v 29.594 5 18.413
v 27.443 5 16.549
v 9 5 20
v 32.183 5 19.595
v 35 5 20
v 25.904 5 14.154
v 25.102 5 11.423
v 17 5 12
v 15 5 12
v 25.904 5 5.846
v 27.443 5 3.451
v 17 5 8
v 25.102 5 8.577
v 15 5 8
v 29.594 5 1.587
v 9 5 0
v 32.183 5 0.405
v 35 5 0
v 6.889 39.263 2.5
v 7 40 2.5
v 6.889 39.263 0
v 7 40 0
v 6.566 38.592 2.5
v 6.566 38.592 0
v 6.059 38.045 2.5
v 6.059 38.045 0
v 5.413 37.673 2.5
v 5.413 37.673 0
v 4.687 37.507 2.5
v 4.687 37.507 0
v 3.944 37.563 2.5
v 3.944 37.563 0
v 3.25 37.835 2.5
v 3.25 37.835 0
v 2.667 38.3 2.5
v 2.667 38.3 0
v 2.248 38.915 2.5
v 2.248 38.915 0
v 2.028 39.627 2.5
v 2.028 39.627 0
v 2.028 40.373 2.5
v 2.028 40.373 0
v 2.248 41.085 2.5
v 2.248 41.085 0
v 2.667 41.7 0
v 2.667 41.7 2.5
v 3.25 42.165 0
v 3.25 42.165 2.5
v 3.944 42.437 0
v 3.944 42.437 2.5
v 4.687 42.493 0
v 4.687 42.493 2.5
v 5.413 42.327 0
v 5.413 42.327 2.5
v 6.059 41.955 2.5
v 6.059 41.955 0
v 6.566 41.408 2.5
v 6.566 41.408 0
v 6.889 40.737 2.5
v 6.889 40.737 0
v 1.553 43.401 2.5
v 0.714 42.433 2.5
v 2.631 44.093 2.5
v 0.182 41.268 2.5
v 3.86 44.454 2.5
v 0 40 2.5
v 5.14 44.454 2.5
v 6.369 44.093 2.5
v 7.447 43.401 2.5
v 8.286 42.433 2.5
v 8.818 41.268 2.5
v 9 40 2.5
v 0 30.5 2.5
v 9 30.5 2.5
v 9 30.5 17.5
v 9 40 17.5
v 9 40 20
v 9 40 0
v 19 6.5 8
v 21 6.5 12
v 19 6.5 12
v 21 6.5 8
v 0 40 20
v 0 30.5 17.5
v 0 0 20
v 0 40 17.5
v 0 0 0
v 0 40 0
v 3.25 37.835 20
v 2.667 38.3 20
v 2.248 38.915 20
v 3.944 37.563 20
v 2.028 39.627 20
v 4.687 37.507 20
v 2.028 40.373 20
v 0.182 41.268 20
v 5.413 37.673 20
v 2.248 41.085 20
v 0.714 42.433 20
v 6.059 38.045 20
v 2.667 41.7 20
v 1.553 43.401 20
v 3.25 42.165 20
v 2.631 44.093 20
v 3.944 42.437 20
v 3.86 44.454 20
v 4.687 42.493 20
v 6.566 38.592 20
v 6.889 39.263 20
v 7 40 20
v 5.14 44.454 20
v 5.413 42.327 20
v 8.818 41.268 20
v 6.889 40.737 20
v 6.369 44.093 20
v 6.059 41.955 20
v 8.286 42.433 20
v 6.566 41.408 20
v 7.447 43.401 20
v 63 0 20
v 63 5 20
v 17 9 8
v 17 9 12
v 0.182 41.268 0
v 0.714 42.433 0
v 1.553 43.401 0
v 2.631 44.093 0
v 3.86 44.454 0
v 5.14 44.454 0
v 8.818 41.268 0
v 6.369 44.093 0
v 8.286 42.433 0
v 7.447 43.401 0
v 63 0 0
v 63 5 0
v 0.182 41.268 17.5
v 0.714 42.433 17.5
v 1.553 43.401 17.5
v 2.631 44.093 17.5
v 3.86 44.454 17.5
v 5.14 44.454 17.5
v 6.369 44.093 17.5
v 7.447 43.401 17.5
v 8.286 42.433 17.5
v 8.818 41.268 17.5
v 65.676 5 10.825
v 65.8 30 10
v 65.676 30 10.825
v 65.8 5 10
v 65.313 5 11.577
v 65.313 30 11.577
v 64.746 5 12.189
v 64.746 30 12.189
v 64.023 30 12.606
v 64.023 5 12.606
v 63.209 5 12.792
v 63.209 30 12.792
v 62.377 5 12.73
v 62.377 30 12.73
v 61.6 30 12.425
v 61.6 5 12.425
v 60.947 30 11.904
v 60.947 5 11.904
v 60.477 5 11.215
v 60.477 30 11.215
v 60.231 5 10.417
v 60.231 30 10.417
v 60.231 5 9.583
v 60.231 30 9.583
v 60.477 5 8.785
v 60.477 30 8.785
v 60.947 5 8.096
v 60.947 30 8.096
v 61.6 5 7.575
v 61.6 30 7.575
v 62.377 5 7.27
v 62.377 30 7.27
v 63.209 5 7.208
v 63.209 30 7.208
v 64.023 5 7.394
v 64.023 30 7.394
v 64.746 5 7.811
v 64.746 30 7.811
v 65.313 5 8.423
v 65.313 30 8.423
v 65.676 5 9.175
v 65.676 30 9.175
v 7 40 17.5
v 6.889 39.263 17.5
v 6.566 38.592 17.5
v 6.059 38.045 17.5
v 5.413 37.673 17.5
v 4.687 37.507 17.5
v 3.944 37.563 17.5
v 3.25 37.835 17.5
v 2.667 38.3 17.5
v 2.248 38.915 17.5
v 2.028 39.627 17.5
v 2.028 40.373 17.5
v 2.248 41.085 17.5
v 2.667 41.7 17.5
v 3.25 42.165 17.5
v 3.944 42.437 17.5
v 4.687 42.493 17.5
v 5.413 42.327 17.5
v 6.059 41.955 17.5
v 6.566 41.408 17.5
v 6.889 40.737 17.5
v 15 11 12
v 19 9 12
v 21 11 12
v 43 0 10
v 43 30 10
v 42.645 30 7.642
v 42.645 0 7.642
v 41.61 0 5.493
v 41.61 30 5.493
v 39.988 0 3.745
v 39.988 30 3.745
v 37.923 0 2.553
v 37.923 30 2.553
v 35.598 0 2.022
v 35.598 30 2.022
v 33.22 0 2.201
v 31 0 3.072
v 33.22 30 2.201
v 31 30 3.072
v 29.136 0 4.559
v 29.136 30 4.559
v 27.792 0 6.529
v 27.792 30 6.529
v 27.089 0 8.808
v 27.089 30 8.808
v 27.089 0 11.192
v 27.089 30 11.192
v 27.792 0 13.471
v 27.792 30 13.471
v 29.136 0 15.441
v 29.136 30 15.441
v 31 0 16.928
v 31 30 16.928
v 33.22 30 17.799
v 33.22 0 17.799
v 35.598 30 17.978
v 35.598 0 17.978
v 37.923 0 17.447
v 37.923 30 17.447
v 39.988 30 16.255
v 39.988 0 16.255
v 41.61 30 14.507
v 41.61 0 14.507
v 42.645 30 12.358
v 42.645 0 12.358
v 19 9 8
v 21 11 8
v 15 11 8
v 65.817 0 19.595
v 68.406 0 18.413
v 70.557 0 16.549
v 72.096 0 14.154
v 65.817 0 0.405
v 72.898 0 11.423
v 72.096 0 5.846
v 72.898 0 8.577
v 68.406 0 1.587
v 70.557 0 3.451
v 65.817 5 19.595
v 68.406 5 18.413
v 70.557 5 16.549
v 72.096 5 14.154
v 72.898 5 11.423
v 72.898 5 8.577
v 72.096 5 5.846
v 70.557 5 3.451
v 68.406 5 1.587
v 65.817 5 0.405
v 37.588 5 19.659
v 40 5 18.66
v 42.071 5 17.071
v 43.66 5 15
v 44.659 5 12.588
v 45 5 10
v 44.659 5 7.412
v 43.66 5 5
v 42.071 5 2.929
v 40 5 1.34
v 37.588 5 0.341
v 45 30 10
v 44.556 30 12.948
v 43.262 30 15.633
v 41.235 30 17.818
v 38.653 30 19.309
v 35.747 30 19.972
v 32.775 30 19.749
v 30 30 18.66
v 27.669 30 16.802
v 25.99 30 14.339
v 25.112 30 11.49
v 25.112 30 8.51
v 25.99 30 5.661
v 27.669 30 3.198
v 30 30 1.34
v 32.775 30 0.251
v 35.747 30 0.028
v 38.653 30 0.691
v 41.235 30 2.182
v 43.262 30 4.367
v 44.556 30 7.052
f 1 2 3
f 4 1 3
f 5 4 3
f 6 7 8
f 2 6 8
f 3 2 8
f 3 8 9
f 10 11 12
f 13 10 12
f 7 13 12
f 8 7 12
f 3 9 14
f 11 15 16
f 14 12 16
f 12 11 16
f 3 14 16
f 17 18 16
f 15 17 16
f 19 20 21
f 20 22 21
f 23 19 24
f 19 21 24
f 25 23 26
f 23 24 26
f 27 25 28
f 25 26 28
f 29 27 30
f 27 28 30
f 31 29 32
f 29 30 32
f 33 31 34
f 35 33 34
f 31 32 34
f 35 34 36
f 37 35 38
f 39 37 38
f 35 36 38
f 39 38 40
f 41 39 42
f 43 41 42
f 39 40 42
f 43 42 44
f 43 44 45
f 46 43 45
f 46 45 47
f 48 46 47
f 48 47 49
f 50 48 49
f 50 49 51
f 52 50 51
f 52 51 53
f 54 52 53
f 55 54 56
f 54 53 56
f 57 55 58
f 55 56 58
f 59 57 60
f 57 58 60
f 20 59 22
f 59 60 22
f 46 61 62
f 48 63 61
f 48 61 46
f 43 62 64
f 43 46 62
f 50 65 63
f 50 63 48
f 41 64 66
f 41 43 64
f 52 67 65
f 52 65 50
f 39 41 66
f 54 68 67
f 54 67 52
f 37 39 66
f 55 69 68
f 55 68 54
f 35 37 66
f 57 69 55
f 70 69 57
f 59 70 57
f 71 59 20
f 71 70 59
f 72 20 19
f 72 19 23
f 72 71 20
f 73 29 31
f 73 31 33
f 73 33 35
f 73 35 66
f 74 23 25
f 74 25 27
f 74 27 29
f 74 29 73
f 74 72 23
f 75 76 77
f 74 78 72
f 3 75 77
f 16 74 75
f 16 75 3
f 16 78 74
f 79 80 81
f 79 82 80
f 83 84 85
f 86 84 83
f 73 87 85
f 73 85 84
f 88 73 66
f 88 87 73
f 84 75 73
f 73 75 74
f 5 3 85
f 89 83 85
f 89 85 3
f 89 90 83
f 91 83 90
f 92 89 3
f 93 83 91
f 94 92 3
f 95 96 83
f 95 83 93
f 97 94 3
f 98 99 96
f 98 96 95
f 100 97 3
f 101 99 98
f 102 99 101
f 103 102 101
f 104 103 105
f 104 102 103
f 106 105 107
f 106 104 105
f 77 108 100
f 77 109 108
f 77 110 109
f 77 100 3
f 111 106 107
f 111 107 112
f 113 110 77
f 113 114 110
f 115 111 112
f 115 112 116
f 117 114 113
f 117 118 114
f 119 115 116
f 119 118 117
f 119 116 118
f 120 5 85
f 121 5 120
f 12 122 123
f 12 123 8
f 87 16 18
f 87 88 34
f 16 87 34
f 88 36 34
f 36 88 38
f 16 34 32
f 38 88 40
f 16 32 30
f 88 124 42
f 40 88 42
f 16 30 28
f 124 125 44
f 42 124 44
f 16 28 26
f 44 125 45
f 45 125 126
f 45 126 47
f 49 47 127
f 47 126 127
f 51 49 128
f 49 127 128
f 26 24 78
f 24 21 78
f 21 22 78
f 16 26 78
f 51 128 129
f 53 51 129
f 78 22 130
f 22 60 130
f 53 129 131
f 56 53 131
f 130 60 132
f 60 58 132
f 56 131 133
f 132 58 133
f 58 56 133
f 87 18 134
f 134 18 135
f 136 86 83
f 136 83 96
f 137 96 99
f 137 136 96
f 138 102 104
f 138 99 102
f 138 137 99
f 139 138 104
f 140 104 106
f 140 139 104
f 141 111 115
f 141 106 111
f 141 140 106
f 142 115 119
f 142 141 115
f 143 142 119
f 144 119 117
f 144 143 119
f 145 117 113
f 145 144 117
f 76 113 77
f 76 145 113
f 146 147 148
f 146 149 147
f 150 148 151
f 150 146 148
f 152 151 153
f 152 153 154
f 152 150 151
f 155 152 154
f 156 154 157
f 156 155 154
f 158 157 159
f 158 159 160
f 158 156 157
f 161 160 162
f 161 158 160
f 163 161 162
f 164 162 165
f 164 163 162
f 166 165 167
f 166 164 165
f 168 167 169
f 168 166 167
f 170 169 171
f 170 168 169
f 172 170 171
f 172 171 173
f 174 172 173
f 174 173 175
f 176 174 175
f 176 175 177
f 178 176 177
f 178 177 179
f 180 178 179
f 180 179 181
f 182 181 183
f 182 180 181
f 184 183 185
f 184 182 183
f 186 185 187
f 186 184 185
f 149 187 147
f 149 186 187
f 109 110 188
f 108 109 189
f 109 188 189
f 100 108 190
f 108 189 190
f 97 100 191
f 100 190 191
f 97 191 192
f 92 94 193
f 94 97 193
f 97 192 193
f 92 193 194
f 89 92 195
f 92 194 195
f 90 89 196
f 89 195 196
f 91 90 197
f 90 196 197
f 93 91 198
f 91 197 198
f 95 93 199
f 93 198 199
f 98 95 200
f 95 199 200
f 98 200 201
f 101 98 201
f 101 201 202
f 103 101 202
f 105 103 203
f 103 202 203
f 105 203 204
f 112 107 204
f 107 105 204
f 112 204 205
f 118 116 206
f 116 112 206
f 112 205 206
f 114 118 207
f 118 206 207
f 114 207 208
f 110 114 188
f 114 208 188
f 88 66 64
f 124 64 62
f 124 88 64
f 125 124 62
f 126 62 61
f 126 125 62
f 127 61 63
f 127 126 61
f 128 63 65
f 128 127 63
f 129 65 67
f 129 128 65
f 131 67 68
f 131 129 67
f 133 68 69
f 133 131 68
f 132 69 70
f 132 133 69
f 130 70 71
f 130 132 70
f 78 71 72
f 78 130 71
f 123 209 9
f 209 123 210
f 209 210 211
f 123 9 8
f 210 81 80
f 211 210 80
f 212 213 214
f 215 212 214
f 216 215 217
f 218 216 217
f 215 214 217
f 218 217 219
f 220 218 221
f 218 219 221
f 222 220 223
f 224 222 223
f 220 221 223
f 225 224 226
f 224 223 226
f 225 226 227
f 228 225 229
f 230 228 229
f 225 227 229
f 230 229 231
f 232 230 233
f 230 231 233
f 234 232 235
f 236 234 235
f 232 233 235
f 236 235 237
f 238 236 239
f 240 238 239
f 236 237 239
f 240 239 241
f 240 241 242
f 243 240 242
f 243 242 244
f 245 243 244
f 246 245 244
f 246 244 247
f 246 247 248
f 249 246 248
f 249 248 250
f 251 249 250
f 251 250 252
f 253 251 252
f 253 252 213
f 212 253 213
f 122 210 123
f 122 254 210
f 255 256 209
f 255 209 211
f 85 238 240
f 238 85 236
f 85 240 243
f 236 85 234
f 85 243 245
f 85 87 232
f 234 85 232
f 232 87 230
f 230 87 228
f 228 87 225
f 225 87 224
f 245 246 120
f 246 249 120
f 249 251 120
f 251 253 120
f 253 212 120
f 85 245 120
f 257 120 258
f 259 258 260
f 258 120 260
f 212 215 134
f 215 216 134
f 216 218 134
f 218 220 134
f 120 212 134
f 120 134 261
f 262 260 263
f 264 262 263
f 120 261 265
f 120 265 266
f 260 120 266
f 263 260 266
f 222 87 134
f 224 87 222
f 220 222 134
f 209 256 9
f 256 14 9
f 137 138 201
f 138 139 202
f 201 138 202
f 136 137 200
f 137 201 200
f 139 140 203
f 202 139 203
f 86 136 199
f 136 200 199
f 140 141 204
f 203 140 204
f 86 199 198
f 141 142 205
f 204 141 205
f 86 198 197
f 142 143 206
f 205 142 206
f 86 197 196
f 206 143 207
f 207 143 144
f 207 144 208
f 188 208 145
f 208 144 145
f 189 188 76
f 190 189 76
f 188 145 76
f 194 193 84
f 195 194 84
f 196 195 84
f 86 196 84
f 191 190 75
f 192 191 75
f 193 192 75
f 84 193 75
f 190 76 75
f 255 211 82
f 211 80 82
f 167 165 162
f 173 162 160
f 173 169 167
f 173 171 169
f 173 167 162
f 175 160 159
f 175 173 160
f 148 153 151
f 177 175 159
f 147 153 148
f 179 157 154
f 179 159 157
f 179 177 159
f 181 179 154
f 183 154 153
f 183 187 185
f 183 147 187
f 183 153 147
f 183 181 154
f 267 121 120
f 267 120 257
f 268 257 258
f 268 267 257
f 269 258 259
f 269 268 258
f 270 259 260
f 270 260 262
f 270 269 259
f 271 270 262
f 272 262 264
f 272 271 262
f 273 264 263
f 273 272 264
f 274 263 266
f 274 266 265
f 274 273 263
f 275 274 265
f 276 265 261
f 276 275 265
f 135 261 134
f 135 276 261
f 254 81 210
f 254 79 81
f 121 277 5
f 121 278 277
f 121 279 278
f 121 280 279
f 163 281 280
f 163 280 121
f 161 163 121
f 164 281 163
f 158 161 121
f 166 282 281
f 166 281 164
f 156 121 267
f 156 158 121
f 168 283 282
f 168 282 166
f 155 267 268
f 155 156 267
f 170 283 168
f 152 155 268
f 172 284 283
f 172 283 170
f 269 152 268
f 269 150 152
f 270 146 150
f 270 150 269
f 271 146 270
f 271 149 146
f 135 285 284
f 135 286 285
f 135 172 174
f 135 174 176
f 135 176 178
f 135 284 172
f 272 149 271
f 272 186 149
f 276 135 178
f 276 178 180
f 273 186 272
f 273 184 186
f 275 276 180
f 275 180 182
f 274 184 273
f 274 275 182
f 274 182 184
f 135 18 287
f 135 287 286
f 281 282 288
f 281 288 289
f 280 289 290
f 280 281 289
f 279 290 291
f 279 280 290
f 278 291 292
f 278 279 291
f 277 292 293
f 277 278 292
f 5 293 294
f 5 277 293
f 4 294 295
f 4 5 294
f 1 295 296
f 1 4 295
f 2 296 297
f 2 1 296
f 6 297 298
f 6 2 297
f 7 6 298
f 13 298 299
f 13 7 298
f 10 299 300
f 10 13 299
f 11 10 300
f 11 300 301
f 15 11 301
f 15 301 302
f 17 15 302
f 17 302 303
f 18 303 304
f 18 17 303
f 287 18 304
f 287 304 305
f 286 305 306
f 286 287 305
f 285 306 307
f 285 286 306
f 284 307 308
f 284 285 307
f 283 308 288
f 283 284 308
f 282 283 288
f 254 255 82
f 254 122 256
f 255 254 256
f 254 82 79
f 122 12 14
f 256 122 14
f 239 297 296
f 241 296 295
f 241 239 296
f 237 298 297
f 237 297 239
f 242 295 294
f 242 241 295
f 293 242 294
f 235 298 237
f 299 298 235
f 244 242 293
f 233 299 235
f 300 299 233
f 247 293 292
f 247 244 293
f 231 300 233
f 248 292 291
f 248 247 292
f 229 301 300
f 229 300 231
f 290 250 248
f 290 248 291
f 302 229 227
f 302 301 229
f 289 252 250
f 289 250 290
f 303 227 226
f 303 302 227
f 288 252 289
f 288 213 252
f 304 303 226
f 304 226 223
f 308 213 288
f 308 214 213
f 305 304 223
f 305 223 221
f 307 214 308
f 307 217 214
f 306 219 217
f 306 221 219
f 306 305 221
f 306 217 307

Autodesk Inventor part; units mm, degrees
ref_plane "YZ Plane" through (0, 0, 0) normal (1, 0, 0) x (0, 1, 0)
ref_plane "XZ Plane" through (0, 0, 0) normal (0, 1, 0) x (-1, 0, 0)
ref_plane "XY Plane" through (0, 0, 0) normal (0, 0, 1) x (1, 0, 0)
sketch "Sketch1" plane through (0, 0, 0) normal (0, 0, 1) x (1, 0, 0)
  line L0 (0, 0) -> (0, 40)
  line L1 (0, 0) -> (63, 0)
  line L2 (63, 0) -> (63, 5)
  line L3 (63, 5) -> (9, 5)
  arc A0 (9, 40) -> (0, 40) centre (4.5, 40) ccw
  line L4 (9, 40) -> (9, 5)
  circle A1 centre (4.5, 40) radius 2.5
  dimension "d0" = 40
  dimension "d2" = 5
  dimension "d6" = 4.5
  dimension "d7" = 5
  dimension "d8" = 9
  dimension "d9" = 54
  dimension "d47" = 32.5
extrude "Extrusion1" add sketch "Sketch1" along normal blind 20
sketch "Sketch2" plane through (9, 5, 0) normal (0, 1, 0) x (1, 0, 0)
  line L0 (0, 0) -> (0, -20) projected
  circle A0 centre (26, -10) radius 10
  line L1 (0, 0) -> (54, 0) projected
  circle A1 centre (54, -10) radius 2.8
  line L2 (54, 0) -> (54, -20) projected
  point P0 (-9, 0)
  dimension "d14" = 20
  dimension "d16" = 26
  dimension "d20" = 5.6
  dimension "d21" = 10
  dimension "d22" = 15.2
  dimension "d67" = 0
sketch "Sketch7" plane through (9, 5, 0) normal (1, 0, 0) x (0, 0, -1)
  line L0 (-10, 41.0364) -> (-10, 39.6436)
  line L1 (0, 39.5) -> (-20, 39.5) projected
  line L2 (-2.5, 39.5) -> (-2.5, 25.5)
  line L3 (-17.5, 39.5) -> (-17.5, 25.5)
  line L4 (-17.5, 39.5) -> (-2.5, 39.5)
  line L5 (0, 32.5) -> (-20, 32.5) projected
  line L6 (-17.5, 25.5) -> (-2.5, 25.5)
  point P0 (0, -5)
  dimension "d40" = 14
  dimension "d41" = 14
  dimension "d42" = 15
extrude "Extrusion5" cut sketch "Sketch7" against normal blind 14
extrude "Extrusion6" add sketch "Sketch2" along normal blind 25
sketch "Sketch9" plane through (35, 30, 10) normal (0, 1, 0) x (1, 0, 0)
  circle A0 centre (0, 0) radius 8
  point P0 (-35, 10)
  dimension "d50" = 16
extrude "Extrusion7" cut sketch "Sketch9" against normal blind 31
sketch "Sketch10" plane through (9, 5, 20) normal (0, 1, 0) x (1, 0, 0)
  line L0 (6, 8) -> (12, 8)
  line L1 (12, 8) -> (12, 12)
  line L2 (12, 12) -> (6, 12)
  line L3 (6, 12) -> (6, 8)
  line L4 (26, 0) -> (0, 0) projected
  line L5 (0, 2.5) -> (0, 17.5) projected
  point P0 (-9, 20)
  dimension "d53" = 6
  dimension "d54" = 4
  dimension "d55" = 8
  dimension "d56" = 6
extrude "Extrusion8" add sketch "Sketch10" along normal blind 6
sketch "Sketch11" plane through (21, 5, 8) normal (0, 0, -1) x (-1, 0, 0)
  line L0 (2, 4) -> (4, 4)
  line L1 (6, 0) -> (6, 6) projected
  line L2 (12, 0) -> (-14, 0) projected
  line L3 (0, 0) -> (6, 0)
  line L4 (0, 1.5) -> (0, 0)
  line L5 (6, 0) -> (0, 0)
  line L6 (0, 0) -> (3, 0)
  line L7 (0, 1.5) -> (2, 1.5)
  line L8 (2, 1.5) -> (2, 4)
  line L9 (3, 0) -> (0, 0)
  line L10 (4, 4) -> (4, 0)
  line L11 (0, 0) -> (6, 0) projected
  line L12 (0, 0) -> (4, 0)
  point P0 (21, -5)
  dimension "d59" = 2
  dimension "d60" = 2
  dimension "d61" = 4
  dimension "d62" = 1.5
extrude "Extrusion9" cut sketch "Sketch11" against normal blind 4
sketch "Sketch12" plane through (35, 5, 0) normal (0, 1, 0) x (1, 0, 0)
  line L0 (28, 0) -> (28, -20) projected
  arc A0 (28, -20) -> (28, 0) centre (28, -10) ccw
  line L1 (28, 0) -> (-35, 0) projected
  line L2 (28, 0) -> (28, -20)
extrude "Extrusion10" add sketch "Sketch12" against normal blind 5
equation "\"d21\" = d19"
equation "\"d40\" = d41"
equation "\"d19\" = 0.5 * d14"
properties part number "ValveBaseMk2.4"
